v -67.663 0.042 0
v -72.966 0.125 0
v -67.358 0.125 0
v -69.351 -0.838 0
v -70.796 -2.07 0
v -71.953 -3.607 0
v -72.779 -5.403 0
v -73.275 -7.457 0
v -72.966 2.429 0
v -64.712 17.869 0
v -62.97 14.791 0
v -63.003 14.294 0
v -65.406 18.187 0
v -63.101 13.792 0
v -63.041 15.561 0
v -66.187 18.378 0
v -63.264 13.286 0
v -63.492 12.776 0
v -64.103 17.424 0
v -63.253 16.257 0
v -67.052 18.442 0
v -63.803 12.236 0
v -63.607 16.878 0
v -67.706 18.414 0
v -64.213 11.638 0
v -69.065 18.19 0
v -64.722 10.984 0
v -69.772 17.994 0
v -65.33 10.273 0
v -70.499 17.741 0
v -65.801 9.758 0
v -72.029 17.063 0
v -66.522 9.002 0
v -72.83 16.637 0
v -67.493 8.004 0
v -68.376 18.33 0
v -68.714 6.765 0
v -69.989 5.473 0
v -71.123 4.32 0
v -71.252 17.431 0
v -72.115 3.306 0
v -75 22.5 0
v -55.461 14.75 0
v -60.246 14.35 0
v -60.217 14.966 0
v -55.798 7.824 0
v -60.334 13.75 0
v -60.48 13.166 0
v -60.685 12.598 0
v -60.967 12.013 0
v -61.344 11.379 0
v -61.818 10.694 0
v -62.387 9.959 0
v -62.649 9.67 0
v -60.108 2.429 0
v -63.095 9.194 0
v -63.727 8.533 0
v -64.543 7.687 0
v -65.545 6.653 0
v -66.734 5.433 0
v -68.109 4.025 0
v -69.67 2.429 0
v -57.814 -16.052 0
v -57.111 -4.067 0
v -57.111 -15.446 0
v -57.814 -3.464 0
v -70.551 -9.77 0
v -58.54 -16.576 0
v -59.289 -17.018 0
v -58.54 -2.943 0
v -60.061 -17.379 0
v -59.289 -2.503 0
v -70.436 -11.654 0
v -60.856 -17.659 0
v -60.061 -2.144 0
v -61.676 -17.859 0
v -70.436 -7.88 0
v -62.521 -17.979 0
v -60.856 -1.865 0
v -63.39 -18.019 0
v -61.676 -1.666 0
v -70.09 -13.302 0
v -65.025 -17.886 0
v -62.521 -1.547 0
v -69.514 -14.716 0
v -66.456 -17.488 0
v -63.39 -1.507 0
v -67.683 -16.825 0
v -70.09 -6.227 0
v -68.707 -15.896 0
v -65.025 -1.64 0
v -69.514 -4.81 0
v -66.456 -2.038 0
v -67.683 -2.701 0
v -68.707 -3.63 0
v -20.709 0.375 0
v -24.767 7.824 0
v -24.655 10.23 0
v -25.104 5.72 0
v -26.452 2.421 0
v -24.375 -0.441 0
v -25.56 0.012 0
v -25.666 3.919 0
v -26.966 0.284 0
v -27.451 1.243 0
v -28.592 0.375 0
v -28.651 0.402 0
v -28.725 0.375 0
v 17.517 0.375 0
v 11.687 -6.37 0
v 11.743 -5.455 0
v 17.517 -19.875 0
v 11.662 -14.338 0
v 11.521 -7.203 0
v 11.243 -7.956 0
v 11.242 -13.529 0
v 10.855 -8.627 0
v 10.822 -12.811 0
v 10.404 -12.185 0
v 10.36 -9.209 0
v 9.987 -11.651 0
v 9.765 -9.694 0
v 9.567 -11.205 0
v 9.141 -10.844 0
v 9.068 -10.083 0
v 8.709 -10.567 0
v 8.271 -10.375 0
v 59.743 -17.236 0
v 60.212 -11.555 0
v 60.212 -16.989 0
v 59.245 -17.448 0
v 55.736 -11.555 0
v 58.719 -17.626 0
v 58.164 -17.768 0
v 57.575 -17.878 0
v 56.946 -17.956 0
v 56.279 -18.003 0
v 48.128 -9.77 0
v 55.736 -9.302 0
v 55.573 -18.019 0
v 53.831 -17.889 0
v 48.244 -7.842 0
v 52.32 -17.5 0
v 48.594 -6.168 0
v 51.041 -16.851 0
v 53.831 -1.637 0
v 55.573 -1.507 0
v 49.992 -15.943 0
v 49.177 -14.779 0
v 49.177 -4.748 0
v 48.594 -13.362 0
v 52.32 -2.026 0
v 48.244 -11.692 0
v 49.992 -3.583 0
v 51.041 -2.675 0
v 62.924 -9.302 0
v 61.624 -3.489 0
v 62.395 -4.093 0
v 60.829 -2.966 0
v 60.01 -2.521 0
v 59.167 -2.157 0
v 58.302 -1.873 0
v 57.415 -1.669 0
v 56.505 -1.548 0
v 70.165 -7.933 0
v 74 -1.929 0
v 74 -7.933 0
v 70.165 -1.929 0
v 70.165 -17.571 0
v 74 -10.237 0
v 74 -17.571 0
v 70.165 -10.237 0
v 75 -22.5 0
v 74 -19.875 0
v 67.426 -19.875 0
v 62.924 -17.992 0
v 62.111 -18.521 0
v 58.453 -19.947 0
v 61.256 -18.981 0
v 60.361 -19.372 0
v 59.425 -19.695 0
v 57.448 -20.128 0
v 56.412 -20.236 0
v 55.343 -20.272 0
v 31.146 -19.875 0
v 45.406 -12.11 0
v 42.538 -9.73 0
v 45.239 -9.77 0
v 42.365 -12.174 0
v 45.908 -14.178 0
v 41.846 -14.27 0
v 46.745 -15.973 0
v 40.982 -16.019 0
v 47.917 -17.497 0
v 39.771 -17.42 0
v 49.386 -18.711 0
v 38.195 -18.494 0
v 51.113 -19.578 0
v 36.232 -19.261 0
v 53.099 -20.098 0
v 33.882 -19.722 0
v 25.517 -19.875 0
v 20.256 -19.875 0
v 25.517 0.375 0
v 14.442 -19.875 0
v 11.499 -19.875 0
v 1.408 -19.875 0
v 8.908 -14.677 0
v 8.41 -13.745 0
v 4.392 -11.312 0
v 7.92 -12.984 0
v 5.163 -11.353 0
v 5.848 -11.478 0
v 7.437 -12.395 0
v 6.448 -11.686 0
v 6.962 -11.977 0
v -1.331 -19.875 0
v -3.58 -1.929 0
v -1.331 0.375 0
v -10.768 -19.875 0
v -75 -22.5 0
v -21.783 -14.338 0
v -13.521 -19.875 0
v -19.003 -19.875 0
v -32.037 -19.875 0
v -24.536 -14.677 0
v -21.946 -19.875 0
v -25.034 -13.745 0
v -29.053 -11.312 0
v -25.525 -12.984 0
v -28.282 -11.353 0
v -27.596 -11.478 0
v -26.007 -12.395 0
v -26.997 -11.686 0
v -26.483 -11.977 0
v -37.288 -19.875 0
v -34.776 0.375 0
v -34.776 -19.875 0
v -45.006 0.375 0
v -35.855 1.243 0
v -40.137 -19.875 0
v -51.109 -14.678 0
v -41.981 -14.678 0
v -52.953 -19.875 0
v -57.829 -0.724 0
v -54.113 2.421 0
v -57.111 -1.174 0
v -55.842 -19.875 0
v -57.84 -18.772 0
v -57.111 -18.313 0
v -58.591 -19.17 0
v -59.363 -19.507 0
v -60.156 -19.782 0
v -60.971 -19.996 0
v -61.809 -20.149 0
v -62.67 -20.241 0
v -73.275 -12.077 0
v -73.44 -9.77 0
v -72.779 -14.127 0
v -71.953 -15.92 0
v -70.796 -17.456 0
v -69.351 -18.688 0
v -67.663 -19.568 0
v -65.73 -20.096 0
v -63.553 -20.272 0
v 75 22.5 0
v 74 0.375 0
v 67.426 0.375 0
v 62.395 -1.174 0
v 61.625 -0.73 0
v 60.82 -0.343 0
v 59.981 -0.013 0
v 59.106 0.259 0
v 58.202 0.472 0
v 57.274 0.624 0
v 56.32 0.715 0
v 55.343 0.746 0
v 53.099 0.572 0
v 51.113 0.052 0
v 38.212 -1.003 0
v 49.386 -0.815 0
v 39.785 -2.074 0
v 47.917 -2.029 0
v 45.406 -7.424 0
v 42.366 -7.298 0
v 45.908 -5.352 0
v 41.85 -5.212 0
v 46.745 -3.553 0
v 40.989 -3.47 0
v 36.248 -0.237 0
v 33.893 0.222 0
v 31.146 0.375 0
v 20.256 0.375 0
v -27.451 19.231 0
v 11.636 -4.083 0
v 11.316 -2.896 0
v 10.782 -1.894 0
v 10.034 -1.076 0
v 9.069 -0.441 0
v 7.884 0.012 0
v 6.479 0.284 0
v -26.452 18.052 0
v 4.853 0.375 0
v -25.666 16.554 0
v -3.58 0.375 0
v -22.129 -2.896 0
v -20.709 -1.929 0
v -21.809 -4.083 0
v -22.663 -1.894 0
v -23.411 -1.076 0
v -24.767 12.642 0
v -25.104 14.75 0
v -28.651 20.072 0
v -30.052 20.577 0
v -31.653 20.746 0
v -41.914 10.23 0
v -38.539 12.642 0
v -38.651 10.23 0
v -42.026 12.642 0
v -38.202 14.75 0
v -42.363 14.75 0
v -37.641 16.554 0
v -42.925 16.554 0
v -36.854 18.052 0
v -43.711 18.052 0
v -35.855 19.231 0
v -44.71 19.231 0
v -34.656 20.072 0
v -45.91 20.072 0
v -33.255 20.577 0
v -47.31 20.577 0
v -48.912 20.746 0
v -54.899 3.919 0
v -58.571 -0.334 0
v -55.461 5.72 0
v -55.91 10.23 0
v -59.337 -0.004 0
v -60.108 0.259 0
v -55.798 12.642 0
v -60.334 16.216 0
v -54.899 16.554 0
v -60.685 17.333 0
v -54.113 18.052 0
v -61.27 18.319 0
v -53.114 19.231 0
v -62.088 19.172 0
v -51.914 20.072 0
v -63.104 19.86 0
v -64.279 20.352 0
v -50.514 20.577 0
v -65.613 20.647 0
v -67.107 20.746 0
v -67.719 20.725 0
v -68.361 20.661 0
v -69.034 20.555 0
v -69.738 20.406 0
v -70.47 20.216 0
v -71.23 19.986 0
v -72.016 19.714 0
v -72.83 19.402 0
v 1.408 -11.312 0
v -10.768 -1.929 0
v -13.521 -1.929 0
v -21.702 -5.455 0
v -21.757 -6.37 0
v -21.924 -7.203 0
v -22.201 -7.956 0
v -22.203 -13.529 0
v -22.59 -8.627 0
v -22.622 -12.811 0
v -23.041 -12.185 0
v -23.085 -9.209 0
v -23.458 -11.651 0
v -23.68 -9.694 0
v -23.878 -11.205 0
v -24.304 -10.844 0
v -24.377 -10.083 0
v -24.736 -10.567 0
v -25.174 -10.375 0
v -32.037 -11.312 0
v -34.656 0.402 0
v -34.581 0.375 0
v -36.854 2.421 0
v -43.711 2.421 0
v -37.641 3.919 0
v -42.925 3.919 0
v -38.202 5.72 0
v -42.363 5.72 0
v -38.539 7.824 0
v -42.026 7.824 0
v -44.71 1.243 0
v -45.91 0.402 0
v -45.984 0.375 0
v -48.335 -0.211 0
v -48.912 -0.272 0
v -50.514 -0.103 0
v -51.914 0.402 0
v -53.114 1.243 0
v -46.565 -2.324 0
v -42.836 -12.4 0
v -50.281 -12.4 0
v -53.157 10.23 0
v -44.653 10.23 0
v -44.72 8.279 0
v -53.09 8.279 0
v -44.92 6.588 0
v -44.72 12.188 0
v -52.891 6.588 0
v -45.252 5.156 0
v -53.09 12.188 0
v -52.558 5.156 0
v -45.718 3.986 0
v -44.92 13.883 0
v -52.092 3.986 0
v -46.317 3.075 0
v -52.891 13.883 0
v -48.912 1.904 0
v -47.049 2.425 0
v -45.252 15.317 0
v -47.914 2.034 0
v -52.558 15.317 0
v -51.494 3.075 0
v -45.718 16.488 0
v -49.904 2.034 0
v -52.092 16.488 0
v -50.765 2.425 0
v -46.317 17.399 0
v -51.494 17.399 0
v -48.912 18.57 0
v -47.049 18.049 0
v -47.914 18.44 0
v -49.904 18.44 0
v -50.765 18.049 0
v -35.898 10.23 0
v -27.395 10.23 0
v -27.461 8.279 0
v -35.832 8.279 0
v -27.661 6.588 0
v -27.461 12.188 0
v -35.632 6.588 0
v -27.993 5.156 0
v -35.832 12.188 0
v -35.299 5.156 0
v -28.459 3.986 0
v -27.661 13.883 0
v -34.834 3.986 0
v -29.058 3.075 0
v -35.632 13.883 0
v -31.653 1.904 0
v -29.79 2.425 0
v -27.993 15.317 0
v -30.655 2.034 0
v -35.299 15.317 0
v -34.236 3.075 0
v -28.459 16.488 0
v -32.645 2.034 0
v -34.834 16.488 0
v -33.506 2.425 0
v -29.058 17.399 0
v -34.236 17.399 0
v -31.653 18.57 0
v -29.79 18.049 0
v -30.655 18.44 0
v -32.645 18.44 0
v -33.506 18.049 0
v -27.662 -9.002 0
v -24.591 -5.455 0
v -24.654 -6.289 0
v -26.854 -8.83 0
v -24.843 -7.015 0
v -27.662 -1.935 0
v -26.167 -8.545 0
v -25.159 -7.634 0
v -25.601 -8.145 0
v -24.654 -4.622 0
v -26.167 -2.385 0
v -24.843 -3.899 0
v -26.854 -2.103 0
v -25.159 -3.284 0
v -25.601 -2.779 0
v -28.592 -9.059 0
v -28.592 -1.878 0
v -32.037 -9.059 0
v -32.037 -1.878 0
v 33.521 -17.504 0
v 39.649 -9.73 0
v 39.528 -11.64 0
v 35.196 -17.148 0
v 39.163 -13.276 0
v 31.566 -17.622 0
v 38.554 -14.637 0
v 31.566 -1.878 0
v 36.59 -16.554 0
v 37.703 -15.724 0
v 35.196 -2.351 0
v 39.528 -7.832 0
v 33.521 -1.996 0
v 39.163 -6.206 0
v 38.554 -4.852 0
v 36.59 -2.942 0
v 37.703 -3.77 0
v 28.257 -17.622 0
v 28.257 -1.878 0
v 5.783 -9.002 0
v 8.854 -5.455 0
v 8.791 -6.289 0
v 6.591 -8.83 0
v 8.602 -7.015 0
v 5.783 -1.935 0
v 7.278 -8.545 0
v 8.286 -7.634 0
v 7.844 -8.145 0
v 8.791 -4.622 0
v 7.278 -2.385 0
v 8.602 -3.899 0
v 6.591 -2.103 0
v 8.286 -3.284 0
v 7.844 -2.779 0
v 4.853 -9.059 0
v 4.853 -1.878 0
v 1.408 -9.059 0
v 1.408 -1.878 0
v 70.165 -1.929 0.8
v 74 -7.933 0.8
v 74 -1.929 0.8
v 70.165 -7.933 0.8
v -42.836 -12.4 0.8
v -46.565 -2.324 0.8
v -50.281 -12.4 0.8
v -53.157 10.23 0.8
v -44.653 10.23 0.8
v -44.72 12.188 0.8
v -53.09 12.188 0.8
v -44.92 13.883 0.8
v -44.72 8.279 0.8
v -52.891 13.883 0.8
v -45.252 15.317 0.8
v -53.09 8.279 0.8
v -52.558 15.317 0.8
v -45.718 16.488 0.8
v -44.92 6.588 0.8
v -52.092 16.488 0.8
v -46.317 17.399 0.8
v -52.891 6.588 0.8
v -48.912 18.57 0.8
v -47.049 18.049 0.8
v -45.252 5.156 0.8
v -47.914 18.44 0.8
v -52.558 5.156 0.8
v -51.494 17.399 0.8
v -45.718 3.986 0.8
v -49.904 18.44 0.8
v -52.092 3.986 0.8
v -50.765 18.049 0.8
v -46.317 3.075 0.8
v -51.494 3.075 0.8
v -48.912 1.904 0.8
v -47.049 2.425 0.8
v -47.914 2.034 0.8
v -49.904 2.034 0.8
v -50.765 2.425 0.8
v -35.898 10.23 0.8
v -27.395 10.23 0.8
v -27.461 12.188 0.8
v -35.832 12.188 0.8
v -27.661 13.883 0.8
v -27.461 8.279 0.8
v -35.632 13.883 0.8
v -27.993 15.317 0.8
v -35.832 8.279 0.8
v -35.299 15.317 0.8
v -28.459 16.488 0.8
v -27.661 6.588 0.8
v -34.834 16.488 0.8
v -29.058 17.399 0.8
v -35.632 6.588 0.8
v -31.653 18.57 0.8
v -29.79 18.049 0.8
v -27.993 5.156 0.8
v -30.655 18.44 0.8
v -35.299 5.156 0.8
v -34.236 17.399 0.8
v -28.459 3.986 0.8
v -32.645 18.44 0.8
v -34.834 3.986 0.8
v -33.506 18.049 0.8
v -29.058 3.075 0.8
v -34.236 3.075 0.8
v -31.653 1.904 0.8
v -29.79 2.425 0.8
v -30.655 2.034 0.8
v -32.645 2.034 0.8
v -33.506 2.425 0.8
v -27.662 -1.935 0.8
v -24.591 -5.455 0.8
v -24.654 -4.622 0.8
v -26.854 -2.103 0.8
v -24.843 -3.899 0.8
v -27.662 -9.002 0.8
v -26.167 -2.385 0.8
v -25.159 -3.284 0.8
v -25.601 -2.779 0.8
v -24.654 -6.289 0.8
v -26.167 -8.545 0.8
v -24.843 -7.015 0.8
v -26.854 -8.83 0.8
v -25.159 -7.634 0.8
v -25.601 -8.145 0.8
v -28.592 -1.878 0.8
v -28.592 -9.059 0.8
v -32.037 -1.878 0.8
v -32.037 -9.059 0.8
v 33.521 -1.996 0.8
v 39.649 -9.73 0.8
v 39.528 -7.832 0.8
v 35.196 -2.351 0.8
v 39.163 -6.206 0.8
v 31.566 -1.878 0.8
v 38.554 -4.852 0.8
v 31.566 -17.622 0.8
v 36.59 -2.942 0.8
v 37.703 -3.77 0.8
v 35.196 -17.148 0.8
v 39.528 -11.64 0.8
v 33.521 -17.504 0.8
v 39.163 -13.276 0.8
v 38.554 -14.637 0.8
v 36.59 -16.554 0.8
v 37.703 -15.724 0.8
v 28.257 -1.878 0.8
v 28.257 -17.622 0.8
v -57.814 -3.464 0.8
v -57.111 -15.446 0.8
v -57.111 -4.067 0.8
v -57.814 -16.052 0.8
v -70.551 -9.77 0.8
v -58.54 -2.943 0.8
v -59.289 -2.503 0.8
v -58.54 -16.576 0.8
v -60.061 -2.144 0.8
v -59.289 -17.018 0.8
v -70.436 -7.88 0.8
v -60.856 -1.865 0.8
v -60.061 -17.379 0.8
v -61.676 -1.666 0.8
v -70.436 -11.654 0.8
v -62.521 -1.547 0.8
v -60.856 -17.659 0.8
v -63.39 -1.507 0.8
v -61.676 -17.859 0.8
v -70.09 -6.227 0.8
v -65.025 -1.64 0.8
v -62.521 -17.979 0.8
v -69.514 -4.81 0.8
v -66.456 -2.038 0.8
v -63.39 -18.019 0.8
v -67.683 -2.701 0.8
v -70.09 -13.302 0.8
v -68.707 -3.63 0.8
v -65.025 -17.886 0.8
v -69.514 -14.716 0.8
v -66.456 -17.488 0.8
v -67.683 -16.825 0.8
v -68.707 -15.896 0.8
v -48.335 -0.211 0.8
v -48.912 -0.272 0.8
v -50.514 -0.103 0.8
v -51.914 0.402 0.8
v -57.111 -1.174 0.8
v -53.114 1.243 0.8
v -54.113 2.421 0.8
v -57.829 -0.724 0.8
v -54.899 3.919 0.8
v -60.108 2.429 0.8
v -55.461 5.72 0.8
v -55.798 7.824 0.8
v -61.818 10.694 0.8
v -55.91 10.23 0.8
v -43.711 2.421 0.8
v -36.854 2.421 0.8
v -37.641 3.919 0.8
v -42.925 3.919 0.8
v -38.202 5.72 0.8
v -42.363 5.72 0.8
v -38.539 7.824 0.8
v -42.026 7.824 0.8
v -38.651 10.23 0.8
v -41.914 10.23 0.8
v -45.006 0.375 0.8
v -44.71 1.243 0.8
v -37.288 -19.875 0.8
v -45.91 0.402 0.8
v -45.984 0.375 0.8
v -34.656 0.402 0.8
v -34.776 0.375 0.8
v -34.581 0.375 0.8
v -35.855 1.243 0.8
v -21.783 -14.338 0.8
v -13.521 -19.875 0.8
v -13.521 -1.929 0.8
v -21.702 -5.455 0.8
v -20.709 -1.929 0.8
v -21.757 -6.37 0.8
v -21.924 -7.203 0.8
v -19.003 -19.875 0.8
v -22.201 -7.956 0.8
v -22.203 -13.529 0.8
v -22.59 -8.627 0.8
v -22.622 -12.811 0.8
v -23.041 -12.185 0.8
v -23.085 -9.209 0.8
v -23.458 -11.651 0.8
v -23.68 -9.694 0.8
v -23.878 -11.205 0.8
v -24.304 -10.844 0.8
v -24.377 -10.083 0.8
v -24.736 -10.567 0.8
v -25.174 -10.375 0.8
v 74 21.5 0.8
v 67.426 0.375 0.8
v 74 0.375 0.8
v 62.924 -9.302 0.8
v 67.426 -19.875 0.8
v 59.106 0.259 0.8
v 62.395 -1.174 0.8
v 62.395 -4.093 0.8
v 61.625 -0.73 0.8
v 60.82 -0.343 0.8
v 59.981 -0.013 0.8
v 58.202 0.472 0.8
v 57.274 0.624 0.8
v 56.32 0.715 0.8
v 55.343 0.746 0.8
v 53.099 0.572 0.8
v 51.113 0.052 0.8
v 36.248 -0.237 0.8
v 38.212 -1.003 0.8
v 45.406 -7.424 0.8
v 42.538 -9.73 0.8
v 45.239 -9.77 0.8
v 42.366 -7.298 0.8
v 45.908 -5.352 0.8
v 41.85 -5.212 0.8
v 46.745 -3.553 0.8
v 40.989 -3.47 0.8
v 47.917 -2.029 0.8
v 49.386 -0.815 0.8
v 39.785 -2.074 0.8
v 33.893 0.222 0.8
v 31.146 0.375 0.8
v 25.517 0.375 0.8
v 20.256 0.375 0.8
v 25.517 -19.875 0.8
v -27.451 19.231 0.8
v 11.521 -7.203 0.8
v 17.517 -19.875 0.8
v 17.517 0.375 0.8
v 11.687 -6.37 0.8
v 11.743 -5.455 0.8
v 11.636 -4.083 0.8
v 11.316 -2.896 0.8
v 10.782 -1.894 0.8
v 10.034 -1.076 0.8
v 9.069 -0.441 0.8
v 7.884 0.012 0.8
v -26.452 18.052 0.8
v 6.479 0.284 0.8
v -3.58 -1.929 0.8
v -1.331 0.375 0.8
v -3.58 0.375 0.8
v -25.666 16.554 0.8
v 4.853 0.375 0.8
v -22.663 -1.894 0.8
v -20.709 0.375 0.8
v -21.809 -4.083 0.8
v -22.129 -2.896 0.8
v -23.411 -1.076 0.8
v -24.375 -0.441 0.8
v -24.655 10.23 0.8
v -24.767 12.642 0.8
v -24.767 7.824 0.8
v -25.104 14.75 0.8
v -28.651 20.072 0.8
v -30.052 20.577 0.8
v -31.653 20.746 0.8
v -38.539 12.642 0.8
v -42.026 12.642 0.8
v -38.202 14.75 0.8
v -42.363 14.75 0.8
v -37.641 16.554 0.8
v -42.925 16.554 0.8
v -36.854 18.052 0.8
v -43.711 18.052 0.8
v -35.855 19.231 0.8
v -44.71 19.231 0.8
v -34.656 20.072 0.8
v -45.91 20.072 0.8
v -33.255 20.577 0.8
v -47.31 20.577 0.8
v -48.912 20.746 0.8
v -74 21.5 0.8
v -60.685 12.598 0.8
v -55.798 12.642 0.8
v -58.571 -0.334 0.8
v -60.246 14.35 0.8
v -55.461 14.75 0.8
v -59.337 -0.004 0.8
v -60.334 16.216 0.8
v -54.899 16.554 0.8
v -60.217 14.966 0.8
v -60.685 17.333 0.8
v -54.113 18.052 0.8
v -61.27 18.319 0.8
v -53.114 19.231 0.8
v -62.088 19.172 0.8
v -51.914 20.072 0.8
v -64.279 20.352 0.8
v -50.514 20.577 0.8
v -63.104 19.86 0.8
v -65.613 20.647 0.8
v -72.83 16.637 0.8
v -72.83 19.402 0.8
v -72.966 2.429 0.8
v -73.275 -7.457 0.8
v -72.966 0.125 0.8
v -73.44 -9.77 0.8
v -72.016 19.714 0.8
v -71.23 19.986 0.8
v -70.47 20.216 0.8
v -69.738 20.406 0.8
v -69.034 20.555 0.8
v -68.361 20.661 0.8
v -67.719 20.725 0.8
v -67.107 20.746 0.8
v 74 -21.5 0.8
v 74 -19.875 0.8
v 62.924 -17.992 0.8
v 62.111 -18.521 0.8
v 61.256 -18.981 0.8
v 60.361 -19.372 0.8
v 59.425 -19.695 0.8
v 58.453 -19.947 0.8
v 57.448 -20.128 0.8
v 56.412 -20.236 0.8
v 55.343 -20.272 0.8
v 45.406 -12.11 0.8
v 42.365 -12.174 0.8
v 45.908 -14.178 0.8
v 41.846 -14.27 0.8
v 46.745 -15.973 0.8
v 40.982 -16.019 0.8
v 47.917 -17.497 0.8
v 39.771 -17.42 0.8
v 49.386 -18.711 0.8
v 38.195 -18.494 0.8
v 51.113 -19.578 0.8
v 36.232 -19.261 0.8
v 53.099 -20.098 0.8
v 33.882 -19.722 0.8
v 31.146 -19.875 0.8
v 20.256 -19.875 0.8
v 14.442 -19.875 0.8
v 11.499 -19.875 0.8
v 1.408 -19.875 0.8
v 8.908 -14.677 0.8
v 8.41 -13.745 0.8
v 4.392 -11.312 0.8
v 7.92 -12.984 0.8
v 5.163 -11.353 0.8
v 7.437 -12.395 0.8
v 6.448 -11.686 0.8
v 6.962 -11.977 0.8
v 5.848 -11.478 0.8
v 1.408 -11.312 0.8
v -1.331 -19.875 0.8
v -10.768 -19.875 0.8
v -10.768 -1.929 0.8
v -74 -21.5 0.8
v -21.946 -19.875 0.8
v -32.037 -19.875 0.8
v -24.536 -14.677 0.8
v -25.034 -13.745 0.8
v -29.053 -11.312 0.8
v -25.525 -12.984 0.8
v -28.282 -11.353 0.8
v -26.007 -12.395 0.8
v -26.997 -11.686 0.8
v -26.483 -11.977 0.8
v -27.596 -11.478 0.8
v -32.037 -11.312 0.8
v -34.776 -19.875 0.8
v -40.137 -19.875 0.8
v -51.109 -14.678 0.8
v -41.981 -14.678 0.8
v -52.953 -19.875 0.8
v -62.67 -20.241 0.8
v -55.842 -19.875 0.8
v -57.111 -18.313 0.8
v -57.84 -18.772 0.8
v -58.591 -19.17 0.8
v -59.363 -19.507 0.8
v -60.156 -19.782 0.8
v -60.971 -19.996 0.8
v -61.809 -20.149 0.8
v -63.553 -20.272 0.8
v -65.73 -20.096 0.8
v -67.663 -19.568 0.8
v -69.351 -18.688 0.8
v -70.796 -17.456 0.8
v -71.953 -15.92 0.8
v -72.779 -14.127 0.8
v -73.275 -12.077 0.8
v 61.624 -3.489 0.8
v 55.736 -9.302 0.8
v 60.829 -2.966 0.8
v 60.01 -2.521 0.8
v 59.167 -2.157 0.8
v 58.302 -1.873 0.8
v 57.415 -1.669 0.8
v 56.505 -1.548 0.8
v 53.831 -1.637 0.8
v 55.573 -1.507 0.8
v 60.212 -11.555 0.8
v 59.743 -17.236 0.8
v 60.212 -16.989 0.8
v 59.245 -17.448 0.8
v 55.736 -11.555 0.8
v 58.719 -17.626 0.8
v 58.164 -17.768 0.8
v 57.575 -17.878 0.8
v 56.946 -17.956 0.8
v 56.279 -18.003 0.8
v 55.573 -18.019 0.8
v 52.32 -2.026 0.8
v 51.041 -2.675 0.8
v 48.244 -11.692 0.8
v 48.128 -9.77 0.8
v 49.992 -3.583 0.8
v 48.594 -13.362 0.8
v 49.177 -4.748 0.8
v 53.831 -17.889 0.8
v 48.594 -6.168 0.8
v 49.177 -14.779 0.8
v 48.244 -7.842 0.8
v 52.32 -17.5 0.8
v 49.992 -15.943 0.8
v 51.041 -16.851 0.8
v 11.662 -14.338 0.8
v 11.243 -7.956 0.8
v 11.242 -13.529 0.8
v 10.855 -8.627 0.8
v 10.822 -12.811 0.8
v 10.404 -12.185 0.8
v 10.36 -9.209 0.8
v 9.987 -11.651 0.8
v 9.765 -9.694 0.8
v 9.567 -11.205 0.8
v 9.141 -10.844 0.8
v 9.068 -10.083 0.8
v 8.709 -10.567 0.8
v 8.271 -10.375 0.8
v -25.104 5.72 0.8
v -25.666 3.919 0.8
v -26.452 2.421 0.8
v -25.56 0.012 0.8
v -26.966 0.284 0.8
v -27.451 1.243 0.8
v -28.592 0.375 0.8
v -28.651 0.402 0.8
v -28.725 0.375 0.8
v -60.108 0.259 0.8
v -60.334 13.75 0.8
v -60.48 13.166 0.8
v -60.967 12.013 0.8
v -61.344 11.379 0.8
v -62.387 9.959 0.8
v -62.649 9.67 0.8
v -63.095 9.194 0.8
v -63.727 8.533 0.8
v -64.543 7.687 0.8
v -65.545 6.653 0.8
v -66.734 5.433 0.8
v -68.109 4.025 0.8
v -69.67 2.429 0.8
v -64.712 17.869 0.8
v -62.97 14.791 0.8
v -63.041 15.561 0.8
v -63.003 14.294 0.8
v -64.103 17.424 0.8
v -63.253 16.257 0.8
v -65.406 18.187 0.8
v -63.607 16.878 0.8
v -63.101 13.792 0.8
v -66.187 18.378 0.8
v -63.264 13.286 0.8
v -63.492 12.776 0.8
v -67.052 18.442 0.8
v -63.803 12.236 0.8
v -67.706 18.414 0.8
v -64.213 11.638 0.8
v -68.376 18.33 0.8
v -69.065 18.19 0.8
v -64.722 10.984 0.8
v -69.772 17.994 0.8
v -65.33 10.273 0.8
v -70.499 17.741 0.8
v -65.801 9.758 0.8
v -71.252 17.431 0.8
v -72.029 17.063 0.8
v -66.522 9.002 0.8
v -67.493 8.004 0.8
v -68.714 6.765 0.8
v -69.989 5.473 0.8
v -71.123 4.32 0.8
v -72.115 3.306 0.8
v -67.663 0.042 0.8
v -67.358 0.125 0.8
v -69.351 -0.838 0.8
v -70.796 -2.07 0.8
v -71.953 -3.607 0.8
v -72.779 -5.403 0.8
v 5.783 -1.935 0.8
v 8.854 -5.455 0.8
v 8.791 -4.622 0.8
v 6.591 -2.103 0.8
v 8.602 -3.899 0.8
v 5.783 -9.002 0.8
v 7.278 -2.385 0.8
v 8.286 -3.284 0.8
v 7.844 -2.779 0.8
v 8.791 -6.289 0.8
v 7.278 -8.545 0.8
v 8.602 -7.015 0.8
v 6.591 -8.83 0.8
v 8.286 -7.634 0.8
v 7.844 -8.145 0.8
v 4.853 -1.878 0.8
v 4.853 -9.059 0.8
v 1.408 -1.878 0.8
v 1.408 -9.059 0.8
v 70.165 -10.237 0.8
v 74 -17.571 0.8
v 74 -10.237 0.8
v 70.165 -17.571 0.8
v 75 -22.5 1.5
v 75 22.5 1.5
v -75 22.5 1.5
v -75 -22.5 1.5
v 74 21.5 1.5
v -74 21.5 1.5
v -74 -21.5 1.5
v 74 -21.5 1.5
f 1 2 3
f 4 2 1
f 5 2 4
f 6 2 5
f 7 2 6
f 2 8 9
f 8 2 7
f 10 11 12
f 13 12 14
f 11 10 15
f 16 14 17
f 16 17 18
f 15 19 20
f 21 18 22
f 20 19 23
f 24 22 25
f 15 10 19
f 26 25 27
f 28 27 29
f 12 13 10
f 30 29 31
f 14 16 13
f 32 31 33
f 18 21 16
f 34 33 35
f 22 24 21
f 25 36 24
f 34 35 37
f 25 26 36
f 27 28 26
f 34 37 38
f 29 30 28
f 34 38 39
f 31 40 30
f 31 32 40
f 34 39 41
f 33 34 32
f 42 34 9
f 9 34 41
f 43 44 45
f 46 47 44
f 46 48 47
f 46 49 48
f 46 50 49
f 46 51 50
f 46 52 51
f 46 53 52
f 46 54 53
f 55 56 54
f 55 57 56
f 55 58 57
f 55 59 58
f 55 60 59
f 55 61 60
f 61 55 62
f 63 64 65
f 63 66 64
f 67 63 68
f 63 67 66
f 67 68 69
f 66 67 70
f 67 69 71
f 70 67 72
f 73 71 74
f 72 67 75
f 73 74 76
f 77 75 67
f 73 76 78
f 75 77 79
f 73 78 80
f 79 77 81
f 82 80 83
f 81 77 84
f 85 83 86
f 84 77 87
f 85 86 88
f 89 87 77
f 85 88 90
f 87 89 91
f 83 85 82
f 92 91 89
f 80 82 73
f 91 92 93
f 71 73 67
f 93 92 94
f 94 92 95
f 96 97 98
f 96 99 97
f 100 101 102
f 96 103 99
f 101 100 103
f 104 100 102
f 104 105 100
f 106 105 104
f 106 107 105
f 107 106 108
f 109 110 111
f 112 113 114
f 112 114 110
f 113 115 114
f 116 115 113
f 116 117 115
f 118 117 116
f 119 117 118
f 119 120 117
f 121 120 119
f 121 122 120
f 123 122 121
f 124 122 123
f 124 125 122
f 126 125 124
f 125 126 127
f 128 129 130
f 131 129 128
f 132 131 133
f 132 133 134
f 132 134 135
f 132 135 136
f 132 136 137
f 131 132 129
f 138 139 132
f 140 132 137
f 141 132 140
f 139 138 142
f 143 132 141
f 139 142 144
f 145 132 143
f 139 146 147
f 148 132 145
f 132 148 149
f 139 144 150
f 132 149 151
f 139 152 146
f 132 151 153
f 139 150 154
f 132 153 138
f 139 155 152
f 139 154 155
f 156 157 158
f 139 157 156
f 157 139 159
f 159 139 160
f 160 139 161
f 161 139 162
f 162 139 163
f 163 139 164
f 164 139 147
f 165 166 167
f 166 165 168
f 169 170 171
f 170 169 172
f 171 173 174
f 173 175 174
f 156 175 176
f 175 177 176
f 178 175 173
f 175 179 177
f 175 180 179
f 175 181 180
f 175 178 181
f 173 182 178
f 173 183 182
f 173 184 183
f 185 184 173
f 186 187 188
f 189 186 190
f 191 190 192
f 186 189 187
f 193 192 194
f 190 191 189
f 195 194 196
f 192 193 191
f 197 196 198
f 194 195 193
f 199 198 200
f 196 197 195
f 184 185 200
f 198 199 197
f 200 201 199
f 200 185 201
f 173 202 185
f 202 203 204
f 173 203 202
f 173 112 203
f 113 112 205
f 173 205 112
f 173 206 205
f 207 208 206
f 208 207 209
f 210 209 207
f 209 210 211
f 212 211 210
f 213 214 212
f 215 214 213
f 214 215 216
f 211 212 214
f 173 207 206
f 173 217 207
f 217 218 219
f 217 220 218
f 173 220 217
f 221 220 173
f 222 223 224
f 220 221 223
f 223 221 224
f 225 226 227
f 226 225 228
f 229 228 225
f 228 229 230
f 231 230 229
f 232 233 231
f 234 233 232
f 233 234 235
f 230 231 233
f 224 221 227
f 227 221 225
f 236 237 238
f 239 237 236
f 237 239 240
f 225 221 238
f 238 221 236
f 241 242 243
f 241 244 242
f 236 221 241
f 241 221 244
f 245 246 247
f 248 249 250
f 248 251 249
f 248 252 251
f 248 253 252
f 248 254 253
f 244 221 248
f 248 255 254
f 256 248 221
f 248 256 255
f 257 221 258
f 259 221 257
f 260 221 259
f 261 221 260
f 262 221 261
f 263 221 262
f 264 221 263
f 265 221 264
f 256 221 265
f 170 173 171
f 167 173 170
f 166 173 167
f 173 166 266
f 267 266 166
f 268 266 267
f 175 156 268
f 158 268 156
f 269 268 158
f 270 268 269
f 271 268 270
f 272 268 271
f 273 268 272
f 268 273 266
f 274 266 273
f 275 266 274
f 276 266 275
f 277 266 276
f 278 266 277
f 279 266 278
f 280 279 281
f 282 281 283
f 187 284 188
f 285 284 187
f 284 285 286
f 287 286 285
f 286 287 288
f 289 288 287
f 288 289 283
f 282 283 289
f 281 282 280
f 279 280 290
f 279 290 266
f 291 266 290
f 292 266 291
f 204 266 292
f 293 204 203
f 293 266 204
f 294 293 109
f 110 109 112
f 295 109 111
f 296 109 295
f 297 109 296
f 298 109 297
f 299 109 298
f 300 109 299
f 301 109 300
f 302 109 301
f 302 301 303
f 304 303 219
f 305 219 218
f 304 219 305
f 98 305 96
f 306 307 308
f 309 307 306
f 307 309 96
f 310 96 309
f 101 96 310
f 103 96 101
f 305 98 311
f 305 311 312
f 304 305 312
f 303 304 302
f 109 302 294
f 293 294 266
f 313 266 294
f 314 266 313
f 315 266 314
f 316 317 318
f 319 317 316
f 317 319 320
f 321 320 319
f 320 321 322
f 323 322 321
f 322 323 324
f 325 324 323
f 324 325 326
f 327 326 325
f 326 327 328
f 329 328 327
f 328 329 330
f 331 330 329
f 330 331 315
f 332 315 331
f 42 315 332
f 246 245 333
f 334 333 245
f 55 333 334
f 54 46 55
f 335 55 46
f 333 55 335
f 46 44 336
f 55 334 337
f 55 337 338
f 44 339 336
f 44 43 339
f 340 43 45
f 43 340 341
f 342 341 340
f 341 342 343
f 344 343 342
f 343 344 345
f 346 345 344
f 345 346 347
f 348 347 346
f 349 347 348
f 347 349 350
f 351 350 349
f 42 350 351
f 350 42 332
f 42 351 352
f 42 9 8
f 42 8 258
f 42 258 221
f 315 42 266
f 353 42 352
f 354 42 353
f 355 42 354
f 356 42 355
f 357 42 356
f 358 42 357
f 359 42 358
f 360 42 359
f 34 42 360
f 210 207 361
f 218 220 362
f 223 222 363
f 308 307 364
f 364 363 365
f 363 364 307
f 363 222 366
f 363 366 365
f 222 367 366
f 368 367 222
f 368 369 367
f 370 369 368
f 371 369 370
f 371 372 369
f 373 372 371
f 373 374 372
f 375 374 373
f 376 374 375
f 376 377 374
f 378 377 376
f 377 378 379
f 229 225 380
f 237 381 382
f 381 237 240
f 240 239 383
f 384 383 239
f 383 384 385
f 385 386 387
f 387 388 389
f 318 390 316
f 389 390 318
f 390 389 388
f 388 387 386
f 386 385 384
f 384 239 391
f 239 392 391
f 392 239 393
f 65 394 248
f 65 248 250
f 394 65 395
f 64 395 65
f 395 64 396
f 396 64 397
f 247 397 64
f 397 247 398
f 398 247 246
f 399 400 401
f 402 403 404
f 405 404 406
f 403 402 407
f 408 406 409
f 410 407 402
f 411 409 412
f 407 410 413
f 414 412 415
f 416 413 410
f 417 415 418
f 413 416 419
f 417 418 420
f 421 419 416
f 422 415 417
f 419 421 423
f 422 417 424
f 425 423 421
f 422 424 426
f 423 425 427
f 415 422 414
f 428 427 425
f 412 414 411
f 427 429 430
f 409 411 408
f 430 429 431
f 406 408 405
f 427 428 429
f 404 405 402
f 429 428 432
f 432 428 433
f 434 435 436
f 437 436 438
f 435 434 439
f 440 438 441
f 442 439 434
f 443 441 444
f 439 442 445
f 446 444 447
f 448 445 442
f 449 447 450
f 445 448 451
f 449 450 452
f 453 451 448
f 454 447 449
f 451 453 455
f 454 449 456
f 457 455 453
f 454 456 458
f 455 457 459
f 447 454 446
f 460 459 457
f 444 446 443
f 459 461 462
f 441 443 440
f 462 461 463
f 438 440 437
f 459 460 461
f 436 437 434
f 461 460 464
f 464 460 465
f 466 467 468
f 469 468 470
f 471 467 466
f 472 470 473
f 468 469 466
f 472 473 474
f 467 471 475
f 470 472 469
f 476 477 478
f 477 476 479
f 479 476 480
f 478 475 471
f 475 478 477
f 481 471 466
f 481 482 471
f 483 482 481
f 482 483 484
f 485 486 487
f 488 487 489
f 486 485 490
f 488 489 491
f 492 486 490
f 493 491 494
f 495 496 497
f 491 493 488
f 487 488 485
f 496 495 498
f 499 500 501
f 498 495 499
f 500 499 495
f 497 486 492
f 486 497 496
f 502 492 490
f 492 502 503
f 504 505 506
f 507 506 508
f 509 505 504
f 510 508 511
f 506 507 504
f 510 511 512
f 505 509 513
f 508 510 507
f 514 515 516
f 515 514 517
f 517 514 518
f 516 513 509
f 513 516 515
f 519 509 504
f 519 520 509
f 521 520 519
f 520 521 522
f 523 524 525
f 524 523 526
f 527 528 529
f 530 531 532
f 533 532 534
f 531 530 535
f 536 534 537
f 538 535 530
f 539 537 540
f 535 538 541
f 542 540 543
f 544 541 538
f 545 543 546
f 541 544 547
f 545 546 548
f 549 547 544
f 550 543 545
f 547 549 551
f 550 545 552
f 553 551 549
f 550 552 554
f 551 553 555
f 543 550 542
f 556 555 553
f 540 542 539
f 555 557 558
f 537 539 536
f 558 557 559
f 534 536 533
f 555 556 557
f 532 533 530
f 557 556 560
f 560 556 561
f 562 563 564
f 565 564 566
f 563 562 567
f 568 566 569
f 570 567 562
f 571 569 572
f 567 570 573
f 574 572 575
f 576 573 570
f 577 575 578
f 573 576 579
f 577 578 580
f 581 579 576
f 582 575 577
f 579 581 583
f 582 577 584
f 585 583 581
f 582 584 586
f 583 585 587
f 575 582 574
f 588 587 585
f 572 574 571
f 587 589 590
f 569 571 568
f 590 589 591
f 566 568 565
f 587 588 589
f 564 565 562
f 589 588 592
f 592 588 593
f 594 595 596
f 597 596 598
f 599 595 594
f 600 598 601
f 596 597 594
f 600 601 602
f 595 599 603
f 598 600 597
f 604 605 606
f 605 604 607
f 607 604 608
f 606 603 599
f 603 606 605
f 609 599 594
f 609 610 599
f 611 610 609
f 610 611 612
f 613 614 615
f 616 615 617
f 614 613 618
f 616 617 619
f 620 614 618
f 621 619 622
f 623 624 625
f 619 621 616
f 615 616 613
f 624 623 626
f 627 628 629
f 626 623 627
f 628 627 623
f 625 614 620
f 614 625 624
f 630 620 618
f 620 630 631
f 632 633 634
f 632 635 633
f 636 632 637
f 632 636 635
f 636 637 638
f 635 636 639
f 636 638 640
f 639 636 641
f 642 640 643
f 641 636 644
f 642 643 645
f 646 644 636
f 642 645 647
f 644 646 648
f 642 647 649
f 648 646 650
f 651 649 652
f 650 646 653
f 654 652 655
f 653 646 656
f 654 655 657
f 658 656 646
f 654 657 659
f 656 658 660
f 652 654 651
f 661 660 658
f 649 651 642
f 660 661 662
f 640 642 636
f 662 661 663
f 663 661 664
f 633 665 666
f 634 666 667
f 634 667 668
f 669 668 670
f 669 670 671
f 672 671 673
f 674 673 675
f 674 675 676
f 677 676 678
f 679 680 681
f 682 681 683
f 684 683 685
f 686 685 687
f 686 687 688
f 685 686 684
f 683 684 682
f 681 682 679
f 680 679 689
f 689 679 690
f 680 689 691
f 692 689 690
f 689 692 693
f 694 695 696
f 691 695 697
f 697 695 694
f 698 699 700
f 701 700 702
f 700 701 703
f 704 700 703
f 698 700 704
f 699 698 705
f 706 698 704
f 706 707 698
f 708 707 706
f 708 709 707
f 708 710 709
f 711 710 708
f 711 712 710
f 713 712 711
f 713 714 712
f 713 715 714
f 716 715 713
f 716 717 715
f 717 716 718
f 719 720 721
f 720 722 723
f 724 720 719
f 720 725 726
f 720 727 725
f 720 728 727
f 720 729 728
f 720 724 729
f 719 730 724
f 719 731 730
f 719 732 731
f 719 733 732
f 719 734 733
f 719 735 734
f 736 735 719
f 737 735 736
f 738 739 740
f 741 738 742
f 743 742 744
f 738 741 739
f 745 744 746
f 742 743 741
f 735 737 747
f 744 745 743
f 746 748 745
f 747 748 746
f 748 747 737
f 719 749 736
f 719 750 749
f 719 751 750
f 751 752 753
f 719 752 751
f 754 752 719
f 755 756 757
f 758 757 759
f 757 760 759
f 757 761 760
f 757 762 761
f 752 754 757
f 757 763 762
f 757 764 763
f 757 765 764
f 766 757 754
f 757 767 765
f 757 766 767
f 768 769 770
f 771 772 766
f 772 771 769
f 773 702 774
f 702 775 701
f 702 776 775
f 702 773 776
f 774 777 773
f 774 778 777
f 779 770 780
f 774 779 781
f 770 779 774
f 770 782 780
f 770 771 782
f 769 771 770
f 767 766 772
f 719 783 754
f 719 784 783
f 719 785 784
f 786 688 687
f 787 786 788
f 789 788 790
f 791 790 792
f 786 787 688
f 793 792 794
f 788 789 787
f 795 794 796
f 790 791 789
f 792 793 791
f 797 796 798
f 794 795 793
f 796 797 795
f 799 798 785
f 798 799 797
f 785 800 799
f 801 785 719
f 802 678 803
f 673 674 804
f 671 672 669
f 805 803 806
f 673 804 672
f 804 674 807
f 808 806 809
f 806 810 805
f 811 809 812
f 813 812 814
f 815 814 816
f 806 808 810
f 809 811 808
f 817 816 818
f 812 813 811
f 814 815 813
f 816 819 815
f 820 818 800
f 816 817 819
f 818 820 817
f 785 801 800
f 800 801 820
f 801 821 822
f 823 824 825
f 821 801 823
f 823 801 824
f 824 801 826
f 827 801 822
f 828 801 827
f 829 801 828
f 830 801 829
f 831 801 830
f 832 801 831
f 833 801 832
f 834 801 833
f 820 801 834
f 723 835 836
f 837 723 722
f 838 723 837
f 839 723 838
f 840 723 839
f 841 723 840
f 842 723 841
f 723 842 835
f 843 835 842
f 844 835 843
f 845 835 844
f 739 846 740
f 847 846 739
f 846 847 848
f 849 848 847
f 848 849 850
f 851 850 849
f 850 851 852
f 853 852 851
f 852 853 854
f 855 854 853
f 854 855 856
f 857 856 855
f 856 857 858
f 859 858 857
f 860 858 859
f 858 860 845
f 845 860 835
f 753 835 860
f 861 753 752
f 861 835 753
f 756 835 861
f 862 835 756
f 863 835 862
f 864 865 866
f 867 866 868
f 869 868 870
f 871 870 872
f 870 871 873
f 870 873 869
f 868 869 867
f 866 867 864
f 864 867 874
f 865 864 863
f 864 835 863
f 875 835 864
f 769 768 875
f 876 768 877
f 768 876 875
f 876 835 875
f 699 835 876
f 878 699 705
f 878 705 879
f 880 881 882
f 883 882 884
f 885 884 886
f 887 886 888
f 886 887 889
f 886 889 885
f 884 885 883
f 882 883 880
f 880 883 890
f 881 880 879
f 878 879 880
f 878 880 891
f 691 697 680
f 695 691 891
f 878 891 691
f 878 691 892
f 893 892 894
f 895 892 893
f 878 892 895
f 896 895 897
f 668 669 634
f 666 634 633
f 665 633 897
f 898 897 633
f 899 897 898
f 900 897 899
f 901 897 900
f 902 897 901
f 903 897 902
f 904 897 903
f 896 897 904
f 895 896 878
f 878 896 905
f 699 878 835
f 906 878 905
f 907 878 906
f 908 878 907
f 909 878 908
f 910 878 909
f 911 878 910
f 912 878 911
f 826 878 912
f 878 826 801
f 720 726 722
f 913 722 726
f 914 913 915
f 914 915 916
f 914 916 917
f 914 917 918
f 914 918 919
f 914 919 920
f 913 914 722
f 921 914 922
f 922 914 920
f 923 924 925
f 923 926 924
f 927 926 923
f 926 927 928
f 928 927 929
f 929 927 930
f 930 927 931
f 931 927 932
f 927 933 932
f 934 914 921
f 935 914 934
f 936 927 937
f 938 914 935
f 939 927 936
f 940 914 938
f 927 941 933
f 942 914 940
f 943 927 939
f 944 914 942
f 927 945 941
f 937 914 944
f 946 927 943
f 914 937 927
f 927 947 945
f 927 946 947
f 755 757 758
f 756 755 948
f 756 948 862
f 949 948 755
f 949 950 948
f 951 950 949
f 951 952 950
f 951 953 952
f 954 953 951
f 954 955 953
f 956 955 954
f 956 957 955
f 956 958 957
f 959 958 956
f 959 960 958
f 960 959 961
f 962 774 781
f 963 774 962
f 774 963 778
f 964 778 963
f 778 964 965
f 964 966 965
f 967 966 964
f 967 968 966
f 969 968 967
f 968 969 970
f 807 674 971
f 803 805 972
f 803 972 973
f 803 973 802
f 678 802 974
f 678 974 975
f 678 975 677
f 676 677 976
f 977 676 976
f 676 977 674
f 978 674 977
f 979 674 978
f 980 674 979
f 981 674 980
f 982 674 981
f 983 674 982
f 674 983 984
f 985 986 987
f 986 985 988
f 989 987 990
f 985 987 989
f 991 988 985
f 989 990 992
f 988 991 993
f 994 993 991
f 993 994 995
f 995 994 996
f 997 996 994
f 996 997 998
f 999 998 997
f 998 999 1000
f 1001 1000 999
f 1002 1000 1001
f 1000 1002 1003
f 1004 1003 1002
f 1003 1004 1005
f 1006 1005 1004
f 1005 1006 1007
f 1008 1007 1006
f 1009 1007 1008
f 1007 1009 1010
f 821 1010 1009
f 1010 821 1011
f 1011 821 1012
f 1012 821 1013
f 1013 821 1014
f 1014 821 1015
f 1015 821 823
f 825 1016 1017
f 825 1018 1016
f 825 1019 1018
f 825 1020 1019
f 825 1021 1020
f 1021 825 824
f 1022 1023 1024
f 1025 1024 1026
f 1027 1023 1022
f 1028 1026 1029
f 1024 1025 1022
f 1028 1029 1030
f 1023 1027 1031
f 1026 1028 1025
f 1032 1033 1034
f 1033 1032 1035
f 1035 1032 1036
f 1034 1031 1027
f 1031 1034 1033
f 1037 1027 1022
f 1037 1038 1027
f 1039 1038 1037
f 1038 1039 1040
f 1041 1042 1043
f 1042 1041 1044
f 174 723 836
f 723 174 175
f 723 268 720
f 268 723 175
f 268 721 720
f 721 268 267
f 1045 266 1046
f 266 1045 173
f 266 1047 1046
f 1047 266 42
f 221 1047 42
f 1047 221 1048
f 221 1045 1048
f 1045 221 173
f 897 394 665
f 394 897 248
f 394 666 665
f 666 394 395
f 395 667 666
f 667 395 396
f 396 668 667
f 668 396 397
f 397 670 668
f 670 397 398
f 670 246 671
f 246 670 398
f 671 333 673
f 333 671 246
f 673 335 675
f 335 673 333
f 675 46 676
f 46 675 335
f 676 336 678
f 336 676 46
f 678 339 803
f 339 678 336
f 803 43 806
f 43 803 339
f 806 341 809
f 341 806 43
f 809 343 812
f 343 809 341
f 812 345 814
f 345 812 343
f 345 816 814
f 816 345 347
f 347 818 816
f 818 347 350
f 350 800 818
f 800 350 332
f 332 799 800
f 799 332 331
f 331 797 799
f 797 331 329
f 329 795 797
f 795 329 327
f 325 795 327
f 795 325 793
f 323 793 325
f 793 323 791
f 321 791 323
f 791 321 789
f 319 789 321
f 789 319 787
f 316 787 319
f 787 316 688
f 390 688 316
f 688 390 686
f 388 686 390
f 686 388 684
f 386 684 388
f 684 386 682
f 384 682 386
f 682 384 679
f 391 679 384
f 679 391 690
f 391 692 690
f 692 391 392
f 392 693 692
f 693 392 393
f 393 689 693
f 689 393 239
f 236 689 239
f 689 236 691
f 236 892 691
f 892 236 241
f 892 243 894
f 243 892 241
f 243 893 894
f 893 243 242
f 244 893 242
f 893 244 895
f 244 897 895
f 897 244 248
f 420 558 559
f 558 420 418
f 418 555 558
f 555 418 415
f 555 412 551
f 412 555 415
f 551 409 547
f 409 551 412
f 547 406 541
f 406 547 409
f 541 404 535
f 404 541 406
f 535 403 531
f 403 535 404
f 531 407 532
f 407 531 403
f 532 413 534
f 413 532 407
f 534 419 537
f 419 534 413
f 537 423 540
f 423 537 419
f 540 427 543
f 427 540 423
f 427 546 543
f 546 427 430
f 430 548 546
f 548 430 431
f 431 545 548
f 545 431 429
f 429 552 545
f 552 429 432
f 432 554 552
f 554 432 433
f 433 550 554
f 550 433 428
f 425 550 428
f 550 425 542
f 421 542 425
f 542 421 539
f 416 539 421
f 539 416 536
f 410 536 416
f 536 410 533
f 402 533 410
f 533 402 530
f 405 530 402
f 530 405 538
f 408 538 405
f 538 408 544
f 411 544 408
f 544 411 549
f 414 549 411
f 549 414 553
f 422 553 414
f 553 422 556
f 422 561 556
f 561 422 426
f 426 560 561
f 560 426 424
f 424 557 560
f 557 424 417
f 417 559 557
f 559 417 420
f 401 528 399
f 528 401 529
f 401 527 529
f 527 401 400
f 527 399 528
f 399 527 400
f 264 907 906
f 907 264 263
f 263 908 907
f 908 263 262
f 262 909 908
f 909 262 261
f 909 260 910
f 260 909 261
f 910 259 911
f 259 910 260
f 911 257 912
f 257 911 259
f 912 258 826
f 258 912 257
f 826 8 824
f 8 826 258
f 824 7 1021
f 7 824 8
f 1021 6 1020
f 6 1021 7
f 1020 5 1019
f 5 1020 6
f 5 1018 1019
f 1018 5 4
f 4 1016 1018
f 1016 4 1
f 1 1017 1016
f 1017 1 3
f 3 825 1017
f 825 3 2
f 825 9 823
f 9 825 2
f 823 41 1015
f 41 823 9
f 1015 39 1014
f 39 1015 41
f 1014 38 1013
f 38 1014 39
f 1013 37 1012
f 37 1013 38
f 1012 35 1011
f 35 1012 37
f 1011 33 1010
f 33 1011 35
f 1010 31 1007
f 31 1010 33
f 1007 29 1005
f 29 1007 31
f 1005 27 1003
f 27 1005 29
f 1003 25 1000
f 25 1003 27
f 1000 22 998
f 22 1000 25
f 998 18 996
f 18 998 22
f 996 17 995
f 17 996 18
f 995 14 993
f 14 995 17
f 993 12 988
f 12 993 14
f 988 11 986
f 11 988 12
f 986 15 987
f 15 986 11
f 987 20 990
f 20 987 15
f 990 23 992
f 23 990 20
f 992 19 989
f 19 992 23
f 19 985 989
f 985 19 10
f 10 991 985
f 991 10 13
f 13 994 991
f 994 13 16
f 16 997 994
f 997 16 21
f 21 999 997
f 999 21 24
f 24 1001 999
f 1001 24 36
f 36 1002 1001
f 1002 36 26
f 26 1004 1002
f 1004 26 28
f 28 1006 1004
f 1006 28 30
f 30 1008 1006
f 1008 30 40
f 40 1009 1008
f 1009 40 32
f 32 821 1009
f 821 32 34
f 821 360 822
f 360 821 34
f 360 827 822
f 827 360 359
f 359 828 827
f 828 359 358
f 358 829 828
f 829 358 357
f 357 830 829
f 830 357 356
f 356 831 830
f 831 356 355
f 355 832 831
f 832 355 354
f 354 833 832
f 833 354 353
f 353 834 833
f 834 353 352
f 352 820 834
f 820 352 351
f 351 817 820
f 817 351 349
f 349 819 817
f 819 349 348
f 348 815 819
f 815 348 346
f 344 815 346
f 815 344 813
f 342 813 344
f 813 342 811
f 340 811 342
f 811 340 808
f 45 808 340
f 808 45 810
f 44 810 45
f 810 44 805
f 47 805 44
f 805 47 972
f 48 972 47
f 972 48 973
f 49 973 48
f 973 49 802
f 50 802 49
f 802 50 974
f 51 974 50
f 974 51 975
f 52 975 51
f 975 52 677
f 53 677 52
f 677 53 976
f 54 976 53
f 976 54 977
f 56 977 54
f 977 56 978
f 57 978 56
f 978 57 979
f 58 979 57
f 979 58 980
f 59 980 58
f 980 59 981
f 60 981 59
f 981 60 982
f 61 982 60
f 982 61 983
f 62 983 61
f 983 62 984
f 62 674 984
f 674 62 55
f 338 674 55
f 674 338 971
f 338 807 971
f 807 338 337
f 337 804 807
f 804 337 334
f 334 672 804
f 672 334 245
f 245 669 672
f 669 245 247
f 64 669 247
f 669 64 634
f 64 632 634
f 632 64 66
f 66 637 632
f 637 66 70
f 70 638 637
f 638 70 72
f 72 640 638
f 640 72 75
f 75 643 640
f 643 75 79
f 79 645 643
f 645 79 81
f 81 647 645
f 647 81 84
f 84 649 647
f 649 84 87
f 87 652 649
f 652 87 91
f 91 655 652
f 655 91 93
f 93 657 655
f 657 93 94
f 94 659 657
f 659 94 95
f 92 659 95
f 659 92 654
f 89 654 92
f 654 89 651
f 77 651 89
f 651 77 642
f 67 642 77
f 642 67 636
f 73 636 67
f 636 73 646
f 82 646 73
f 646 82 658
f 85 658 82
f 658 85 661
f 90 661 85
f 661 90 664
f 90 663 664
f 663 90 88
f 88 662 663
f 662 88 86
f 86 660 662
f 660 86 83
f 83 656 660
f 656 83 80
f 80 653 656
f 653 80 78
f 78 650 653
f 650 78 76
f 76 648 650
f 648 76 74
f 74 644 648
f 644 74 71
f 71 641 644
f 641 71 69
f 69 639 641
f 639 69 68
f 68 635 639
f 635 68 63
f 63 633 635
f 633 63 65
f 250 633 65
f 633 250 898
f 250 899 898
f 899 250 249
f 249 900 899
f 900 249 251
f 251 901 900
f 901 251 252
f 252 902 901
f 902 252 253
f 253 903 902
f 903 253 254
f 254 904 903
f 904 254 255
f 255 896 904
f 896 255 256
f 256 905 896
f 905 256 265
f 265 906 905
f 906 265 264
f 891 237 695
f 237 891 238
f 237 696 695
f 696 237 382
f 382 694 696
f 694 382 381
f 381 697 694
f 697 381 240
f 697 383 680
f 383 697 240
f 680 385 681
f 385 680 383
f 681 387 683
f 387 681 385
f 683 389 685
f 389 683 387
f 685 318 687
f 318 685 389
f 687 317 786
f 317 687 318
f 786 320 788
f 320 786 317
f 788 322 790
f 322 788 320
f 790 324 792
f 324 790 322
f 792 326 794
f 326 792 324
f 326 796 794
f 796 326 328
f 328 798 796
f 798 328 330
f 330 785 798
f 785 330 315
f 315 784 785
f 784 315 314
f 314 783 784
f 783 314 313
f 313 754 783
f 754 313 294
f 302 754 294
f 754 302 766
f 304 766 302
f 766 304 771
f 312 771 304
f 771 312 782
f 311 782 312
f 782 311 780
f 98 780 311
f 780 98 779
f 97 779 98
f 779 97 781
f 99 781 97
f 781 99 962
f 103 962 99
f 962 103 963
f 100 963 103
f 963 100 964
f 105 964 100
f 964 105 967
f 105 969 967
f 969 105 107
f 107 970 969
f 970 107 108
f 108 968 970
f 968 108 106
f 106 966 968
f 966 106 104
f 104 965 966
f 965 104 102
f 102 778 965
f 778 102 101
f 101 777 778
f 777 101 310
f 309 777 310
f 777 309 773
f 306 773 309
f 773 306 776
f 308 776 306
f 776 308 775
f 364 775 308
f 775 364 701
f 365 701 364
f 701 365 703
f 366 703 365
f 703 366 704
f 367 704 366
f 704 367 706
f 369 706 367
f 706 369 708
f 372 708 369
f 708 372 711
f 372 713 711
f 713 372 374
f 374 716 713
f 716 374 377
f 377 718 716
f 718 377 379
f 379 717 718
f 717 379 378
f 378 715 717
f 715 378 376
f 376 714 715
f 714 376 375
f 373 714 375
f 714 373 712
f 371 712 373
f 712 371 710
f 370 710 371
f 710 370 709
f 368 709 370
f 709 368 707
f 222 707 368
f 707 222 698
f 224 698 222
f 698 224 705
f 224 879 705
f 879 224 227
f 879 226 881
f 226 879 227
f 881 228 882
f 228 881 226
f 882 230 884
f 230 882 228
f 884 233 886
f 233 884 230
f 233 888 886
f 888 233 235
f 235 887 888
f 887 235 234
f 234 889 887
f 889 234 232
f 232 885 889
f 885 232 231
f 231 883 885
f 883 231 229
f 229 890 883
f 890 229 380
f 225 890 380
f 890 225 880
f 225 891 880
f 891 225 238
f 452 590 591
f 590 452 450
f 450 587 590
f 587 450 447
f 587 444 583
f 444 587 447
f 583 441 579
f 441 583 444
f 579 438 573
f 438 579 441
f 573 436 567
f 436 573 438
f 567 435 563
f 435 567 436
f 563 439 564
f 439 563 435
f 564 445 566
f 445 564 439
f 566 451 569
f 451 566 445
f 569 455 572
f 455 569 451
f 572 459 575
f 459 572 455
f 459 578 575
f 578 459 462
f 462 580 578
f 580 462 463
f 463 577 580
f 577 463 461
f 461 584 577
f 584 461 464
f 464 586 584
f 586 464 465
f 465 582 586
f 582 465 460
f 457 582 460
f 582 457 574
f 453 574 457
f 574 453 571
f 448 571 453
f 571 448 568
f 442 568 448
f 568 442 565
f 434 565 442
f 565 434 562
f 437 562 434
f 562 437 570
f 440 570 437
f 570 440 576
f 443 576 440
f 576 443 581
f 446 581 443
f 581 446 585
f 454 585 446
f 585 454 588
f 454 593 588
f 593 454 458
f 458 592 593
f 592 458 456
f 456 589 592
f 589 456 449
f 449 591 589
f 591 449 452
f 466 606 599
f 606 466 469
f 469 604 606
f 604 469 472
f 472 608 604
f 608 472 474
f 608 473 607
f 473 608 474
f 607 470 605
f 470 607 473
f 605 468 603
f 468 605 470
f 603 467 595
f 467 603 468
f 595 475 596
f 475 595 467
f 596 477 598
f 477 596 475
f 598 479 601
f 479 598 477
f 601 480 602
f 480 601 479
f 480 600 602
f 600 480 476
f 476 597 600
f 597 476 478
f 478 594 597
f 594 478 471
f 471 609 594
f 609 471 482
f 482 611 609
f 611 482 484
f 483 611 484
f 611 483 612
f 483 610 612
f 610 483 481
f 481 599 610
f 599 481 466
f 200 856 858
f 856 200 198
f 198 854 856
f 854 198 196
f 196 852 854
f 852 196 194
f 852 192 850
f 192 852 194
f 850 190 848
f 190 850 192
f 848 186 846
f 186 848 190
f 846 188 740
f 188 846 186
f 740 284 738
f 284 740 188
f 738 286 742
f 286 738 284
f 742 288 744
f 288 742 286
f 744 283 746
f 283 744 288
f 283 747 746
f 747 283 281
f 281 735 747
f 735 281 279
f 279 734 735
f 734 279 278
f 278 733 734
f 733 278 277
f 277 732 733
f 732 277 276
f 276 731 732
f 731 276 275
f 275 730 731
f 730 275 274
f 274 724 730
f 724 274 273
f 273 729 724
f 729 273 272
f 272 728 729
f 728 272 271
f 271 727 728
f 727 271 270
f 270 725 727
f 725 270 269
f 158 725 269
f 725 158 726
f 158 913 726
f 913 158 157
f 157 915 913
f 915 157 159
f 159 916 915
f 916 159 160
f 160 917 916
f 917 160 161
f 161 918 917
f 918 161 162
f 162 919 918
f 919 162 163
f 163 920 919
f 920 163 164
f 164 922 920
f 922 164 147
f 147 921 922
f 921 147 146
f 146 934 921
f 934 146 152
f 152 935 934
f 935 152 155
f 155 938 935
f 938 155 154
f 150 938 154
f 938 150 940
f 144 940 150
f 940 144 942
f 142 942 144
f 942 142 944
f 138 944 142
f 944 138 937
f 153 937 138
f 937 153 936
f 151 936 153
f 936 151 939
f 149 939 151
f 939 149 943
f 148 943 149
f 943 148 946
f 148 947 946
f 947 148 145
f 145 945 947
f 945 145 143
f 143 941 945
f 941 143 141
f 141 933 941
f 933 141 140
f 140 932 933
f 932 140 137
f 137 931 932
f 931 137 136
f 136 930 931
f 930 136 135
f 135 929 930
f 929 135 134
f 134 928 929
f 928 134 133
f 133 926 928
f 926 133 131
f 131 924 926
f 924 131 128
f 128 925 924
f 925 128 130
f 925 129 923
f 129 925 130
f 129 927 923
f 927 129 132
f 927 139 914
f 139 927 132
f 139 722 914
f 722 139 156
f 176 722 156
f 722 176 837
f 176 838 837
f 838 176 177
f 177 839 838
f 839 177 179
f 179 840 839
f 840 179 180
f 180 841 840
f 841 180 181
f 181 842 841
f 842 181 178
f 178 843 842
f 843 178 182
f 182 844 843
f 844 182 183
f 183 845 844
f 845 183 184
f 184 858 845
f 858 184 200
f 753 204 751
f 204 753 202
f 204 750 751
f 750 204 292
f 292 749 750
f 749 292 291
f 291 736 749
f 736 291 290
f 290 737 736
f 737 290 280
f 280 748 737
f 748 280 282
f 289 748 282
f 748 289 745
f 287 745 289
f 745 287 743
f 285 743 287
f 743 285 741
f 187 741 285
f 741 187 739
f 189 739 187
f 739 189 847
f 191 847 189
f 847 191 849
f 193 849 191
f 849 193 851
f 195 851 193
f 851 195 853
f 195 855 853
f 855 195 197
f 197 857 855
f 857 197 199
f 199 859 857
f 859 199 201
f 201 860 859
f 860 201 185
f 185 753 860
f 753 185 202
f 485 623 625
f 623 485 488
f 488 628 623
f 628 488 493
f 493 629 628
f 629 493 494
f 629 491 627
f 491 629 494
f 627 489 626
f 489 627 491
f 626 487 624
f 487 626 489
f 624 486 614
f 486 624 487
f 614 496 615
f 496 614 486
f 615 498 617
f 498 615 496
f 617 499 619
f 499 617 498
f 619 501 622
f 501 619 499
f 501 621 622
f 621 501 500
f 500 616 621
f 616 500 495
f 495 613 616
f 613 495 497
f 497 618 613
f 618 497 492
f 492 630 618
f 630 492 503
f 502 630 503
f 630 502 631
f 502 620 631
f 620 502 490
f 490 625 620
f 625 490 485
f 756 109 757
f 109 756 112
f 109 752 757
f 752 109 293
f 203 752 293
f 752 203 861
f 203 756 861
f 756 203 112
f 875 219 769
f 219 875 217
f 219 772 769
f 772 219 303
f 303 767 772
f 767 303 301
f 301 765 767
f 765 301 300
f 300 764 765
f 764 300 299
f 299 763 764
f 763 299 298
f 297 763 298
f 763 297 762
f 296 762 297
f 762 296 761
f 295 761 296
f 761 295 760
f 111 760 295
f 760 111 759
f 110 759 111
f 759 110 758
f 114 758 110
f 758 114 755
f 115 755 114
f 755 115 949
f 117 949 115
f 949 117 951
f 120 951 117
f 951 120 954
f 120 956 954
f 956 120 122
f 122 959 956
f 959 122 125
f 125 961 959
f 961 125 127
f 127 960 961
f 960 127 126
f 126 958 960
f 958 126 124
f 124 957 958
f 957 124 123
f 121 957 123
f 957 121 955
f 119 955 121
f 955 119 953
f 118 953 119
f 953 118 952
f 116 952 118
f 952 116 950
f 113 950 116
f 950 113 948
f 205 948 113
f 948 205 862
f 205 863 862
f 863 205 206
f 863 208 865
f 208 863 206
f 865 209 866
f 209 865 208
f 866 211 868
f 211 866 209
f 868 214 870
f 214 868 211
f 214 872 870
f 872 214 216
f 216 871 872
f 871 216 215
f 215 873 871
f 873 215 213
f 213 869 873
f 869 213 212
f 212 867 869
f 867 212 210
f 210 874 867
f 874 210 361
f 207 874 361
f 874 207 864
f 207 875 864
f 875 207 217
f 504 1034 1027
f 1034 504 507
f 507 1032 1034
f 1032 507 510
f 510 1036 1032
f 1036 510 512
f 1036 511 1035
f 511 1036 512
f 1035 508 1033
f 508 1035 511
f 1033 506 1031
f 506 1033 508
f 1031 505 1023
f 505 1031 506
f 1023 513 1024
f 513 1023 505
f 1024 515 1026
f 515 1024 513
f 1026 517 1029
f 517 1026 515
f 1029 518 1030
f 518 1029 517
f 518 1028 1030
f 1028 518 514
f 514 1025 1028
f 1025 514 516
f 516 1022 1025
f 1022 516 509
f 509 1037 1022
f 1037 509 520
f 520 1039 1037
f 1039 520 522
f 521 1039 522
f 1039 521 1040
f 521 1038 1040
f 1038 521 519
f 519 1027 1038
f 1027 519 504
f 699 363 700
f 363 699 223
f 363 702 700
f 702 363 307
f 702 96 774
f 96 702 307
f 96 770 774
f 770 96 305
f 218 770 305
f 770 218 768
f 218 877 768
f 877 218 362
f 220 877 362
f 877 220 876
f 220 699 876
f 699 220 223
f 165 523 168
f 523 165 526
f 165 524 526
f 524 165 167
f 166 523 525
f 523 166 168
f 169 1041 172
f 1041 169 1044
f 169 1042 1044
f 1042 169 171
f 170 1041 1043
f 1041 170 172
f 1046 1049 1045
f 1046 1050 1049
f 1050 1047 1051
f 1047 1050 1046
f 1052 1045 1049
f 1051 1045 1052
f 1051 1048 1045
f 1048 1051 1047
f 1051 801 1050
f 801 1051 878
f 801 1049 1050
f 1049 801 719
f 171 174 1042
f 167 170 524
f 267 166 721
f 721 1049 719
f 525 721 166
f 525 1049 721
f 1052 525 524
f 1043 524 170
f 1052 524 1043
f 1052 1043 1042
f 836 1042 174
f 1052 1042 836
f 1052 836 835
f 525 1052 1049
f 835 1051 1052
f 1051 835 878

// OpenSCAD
// file: common.scad
module TitleText(t)
{
  text(t, size=20, halign="left", valign="center", font="Octin Prison:style=Regular");
}

module Board()
{
  board_dimensions = [150, 45];

  linear_extrude(height=0.8)
  {
    difference()
    {
      square(board_dimensions, center=true);
      children();
    }
  }

  linear_extrude(height=1.5)
  {
    difference()
    {
      square(board_dimensions, center=true);
      square(board_dimensions - [2, 2], center=true);
    }
  }
}
// main file
use <common.scad>

module MoxyBoard()
{
  Board()
  {
    /* TODO */

    translate([-75, 10])
    {
      TitleText("200");
    }

    translate([-75, -10])
    {
      TitleText("CARTRIDGES");
    }
  }
}

MoxyBoard();
